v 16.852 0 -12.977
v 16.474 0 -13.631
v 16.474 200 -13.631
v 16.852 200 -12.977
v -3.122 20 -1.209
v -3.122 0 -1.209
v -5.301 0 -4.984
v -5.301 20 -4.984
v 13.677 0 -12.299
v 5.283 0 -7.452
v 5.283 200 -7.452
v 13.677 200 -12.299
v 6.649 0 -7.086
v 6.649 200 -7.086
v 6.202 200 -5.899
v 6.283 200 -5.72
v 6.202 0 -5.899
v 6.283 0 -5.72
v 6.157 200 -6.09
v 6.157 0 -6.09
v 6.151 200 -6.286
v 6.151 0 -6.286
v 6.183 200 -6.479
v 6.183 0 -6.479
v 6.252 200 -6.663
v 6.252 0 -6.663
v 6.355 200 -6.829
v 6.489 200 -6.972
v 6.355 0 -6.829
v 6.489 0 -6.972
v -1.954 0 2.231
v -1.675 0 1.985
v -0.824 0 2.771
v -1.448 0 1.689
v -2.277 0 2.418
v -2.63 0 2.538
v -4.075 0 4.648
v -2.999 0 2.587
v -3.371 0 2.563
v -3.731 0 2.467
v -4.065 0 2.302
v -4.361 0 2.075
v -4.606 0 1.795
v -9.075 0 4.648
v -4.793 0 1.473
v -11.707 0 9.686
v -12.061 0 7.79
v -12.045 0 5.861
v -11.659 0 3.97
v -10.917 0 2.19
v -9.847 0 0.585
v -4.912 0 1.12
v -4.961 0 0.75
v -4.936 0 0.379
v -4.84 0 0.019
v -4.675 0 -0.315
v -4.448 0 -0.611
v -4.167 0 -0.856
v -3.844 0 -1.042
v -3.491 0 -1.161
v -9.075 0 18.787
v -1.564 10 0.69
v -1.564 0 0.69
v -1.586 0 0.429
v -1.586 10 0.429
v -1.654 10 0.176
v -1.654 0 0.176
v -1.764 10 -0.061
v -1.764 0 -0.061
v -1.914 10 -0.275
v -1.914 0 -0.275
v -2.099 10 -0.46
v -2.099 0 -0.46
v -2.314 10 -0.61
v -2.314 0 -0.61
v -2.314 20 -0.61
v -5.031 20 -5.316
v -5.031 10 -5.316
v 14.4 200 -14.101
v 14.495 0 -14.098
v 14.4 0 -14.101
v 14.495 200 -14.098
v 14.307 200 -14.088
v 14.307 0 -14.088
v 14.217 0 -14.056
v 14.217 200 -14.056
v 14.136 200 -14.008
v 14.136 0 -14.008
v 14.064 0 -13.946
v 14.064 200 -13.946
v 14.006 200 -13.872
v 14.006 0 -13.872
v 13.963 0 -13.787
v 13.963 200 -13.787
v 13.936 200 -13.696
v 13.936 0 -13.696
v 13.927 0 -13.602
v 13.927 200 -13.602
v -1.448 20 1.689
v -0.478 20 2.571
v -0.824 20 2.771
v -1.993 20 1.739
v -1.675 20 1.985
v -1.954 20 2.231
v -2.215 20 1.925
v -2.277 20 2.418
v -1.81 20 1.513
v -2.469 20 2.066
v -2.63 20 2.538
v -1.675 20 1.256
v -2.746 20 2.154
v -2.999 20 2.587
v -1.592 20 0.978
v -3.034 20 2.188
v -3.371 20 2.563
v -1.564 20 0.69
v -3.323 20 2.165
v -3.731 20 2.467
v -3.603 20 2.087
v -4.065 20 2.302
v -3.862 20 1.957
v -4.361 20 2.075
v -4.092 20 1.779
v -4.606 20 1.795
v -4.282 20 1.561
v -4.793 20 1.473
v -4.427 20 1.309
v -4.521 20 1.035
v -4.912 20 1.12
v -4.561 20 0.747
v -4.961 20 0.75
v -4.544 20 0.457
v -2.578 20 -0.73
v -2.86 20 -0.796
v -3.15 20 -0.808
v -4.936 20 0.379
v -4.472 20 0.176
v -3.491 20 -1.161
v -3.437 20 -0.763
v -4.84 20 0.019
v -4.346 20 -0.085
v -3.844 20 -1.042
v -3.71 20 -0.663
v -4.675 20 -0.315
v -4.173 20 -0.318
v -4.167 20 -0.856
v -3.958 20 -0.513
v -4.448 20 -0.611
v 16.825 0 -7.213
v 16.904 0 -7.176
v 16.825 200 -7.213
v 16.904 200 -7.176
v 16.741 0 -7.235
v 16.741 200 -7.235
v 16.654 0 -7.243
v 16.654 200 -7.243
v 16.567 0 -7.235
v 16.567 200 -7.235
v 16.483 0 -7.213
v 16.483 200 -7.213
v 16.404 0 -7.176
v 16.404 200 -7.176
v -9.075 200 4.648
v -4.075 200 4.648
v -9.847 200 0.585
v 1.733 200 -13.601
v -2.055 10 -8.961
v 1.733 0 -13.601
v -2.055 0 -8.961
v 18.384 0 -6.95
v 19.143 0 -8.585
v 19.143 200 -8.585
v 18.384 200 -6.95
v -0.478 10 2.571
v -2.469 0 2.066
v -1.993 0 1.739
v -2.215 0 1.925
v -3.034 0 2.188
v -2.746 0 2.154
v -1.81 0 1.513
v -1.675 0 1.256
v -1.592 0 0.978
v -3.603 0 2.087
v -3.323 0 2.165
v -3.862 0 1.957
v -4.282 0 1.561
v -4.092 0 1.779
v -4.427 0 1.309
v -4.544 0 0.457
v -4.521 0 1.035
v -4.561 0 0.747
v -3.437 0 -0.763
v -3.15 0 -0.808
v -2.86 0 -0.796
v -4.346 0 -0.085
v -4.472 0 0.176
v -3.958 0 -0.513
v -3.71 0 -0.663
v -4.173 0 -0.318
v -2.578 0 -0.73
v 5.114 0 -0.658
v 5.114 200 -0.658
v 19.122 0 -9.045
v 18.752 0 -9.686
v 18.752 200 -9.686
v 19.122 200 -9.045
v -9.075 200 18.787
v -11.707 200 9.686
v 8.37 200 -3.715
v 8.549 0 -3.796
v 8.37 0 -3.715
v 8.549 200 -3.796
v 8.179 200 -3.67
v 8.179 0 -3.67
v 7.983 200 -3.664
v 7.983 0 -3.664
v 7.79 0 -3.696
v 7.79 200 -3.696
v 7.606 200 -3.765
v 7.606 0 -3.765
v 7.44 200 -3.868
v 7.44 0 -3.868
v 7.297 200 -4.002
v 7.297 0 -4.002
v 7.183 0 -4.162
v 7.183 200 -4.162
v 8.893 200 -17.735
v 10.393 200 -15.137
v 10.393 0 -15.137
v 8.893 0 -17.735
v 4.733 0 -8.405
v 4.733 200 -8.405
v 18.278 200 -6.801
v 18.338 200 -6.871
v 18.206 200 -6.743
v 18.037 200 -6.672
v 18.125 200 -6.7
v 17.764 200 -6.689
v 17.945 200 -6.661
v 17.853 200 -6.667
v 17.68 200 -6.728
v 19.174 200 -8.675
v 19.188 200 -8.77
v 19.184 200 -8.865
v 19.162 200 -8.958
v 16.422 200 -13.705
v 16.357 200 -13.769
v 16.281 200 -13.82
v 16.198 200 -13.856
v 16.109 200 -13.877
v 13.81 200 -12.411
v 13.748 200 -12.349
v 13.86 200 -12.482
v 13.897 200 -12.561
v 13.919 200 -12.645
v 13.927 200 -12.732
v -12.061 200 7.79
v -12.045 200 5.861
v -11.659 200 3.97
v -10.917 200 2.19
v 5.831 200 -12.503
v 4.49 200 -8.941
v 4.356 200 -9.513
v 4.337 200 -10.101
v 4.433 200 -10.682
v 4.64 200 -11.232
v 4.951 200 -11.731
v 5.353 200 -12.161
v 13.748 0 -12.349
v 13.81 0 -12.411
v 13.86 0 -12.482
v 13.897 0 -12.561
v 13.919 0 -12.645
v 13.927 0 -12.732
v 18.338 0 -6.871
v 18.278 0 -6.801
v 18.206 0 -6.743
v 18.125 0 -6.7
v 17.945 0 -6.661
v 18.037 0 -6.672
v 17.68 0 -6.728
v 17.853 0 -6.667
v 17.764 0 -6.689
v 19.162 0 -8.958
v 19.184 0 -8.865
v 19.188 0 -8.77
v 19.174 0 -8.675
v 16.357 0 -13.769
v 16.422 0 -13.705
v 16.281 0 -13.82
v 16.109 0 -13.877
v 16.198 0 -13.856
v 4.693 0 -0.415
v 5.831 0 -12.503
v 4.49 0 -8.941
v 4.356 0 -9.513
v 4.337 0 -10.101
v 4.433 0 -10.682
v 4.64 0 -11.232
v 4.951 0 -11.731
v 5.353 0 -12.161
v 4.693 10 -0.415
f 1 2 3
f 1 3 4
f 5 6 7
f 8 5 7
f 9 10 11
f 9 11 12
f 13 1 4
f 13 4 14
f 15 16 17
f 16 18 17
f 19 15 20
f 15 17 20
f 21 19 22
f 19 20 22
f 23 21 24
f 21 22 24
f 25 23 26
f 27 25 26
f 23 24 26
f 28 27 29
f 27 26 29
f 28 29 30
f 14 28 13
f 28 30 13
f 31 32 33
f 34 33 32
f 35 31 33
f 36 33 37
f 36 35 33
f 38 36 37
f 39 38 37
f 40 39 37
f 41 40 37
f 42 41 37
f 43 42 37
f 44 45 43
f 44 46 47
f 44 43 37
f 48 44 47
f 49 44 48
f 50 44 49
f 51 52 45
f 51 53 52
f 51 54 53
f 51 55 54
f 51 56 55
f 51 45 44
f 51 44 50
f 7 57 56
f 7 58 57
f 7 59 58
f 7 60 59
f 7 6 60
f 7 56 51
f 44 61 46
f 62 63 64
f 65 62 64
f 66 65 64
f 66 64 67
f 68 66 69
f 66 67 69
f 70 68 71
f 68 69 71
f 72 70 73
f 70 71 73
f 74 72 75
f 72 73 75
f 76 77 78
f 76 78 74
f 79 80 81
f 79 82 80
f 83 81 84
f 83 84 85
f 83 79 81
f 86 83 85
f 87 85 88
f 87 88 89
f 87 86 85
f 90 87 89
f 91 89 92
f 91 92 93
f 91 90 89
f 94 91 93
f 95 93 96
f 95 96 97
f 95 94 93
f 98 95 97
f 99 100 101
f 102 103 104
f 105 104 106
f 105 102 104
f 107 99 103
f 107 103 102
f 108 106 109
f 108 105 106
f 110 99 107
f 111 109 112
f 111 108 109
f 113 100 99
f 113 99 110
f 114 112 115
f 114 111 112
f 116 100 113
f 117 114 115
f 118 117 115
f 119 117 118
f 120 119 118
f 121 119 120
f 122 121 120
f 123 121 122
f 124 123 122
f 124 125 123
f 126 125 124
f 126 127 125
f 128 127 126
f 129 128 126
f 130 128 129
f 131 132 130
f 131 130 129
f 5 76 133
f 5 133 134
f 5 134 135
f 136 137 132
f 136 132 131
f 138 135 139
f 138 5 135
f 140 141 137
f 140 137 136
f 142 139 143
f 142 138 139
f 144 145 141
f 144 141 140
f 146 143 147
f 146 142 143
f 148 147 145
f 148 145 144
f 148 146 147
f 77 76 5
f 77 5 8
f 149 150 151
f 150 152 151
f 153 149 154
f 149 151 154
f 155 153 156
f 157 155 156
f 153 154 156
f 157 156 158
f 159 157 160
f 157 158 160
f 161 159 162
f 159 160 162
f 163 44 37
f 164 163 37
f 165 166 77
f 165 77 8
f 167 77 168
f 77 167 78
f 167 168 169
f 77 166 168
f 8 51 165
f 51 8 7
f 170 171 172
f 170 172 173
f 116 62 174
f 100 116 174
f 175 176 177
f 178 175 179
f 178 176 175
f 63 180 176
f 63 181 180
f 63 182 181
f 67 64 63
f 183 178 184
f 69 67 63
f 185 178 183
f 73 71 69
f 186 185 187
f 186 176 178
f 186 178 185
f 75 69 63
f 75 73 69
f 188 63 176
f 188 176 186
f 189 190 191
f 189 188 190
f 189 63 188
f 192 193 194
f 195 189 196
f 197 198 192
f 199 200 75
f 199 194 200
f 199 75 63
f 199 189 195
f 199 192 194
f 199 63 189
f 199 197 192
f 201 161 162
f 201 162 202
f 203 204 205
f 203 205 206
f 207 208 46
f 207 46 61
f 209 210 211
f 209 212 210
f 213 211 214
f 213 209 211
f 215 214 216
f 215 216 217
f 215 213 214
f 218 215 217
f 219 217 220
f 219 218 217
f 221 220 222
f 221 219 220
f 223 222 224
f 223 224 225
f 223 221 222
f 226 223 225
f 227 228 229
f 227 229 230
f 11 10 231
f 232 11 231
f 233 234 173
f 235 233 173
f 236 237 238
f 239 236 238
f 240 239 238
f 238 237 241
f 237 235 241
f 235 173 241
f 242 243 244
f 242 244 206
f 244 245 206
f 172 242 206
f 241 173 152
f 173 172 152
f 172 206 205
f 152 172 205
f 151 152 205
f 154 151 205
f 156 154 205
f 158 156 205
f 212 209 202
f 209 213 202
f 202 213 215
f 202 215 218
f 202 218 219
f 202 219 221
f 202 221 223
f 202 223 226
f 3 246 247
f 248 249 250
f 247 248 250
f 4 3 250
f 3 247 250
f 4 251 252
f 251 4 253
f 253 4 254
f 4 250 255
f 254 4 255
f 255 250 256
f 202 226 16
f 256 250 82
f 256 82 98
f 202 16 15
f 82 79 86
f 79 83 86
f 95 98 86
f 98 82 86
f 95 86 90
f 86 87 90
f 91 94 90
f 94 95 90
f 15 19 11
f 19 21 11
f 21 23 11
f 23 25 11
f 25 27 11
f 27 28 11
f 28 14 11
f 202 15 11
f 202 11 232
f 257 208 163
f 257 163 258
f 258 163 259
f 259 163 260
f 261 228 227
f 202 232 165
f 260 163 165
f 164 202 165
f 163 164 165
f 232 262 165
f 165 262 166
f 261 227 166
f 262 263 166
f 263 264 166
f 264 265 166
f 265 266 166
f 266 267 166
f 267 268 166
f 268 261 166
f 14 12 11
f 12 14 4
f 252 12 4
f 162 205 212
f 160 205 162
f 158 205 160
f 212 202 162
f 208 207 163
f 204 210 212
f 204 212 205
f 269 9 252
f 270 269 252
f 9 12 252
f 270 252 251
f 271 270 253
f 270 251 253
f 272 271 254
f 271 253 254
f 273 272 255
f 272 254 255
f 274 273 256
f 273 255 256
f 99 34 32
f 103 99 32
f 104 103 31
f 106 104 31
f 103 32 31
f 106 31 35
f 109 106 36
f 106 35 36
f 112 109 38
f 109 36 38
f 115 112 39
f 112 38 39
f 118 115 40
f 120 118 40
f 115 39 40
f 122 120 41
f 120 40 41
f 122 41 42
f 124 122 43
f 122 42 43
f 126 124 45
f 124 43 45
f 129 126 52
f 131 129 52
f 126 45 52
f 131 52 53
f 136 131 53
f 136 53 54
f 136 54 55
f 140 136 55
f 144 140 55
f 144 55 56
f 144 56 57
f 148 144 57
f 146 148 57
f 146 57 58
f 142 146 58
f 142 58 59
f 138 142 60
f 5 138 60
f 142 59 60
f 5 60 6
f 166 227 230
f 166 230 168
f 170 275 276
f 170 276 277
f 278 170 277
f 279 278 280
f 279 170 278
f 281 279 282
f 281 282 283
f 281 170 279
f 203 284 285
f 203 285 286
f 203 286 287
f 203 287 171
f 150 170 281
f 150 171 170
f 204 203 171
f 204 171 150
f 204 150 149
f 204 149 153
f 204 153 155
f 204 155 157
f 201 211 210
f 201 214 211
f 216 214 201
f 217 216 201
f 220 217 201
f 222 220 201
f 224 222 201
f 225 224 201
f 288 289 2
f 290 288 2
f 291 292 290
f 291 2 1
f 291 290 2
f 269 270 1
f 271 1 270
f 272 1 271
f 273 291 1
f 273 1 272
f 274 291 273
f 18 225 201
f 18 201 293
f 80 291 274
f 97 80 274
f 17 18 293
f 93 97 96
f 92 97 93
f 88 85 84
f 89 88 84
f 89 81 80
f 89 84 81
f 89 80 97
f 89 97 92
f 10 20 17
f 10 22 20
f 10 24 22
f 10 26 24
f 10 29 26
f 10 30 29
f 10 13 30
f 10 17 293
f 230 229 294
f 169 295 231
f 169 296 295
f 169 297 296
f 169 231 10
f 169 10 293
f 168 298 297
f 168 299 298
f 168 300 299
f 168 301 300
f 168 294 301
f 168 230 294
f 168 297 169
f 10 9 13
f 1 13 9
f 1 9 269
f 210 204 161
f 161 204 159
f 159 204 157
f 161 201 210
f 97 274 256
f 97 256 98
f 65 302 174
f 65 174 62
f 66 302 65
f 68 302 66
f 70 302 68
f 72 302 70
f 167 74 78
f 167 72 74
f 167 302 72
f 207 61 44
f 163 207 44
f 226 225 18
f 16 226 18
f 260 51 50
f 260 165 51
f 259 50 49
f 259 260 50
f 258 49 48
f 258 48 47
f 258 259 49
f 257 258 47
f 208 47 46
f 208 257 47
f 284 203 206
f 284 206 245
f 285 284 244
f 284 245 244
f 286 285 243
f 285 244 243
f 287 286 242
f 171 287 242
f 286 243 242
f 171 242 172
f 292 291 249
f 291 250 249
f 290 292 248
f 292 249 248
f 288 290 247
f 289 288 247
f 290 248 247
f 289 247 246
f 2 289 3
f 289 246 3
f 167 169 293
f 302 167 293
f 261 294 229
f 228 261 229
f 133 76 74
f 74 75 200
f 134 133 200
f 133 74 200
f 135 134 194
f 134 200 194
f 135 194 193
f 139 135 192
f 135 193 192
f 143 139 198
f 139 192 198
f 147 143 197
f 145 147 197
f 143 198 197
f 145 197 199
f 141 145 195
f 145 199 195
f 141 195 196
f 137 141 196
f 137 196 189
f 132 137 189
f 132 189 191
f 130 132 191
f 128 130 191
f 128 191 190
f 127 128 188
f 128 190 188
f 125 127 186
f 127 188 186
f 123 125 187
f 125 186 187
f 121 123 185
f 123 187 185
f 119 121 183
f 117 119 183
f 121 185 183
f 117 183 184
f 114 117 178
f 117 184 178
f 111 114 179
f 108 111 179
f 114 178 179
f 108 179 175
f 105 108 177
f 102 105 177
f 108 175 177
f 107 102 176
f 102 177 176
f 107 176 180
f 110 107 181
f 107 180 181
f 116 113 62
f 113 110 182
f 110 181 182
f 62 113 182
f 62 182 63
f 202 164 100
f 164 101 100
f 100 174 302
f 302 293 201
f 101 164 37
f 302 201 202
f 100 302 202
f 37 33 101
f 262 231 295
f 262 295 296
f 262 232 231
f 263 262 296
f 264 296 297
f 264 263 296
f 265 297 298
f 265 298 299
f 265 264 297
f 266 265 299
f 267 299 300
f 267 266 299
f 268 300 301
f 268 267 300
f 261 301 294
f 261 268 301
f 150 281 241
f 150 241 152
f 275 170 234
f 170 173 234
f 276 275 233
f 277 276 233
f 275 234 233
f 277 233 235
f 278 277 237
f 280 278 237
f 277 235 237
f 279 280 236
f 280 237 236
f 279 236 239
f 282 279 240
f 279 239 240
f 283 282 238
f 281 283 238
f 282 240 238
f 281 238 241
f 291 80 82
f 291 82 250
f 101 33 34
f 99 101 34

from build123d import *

# Parameters (mm, degrees)
BOSS_EXTRUDE1_DEPTH   = 200
BOSS_EXTRUDE1_2_DEPTH = 200
FILLET1_R             = 0.5
FILLET2_R             = 0.5
BOSS_EXTRUDE3_DEPTH   = 200
FILLET3_R             = 10
FILLET4_R             = 1
FILLET5_R             = 3
CUT_EXTRUDE2_DEPTH    = 20
CUT_EXTRUDE4_DEPTH    = 10


with BuildPart() as part:
    # Sketch1 → Boss-Extrude1 (new body)
    with BuildSketch(Plane(origin=(0, 0, 0), x_dir=(1, 0, 0), z_dir=(0, 1, 0))):
        Polygon((13.927082127, 14.175350351), (16.351953258, 13.843299543), (16.851953258, 12.977274139), (3.059579159, 5.014243241), (2.594699496, 5.900545381), (13.927082127, 12.443299543), align=None)
    extrude(amount=BOSS_EXTRUDE1_DEPTH)

    # Fillet2
    fillet2_edges = [part.edges().sort_by_distance(p)[0] for p in [
        (13.927082127, 100, -14.175350351),
        (16.351953258, 100, -13.843299543),
        (13.927082127, 100, -12.443299543),
    ]]
    fillet(fillet2_edges, radius=FILLET2_R)



with BuildPart() as body_2:
    # Sketch1 → Boss-Extrude1 2 (new body)
    with BuildSketch(Plane(origin=(0, 0, 0), x_dir=(1, 0, 0), z_dir=(0, 1, 0))):
        Polygon((18.751953258, 9.686377605), (19.251953258, 8.820352201), (18.153877046, 6.454326797), (16.653877046, 7.320352201), (5.114206816, 0.657920487), (4.719127398, 1.584521817), align=None)
    extrude(amount=BOSS_EXTRUDE1_2_DEPTH)

    # Fillet1
    fillet1_edges = [body_2.edges().sort_by_distance(p)[0] for p in [
        (19.251953258, 100, -8.820352201),
        (18.153877046, 100, -6.454326797),
        (16.653877046, 100, -7.320352201),
    ]]
    fillet(fillet1_edges, radius=FILLET1_R)


with BuildPart() as part_1:
    add(part.part)

    add(body_2.part)  # Boss-Extrude3 merges body 2
    # Sketch2 → Boss-Extrude3 (add)
    with BuildSketch(Plane(origin=(0, 0, 0), x_dir=(1, 0, 0), z_dir=(0, 1, 0))):
        Polygon((8.182648293, 2.429486), (3.232648293, 11.003137498), (10.393111947, 15.137233116), (8.893111947, 17.735309327), (1.732648293, 13.601213709), (-13.163737181, -4.647533202), (-9.075108531, -18.787281313), (-9.075108531, -4.647533202), (-4.075108531, -4.647533202), align=None)
    extrude(amount=BOSS_EXTRUDE3_DEPTH)

    # Fillet3
    fillet3_edges = [part_1.edges().sort_by_distance(p)[0] for p in [
        (-13.163737181, 100, 4.647533202),
    ]]
    fillet(fillet3_edges, radius=FILLET3_R)

    # Fillet4
    fillet4_edges = [part_1.edges().sort_by_distance(p)[0] for p in [
        (5.782648293, 100, -6.586407938),
        (7.682648293, 100, -3.295511404),
    ]]
    fillet(fillet4_edges, radius=FILLET4_R)

    # Fillet5
    fillet5_edges = [part_1.edges().sort_by_distance(p)[0] for p in [
        (3.232648293, 100, -11.003137498),
    ]]
    fillet(fillet5_edges, radius=FILLET5_R)

    # Sketch3 → Cut-Extrude2 (cut)
    with BuildSketch(Plane(origin=(0, 0, 0), x_dir=(1, 0, 0), z_dir=(0, 1, 0))):
        with BuildLine():
            Line((-6.589903921, 8.016296992), (-2.313602471, 0.609525612))
            ThreePointArc((-2.313602471, 0.609525612), (-4.361026605, -1.438580666), (-1.563602471, -0.689512493))
            Line((-1.563602471, -0.689512493), (0.970355299, -5.078456095))
            Line((0.970355299, -5.078456095), (0.623945137, -5.278456095))
            Line((0.623945137, -5.278456095), (-1.448316815, -1.689193106))
            ThreePointArc((-1.448316815, -1.689193106), (-4.707436766, -1.638580666), (-3.12170845, 1.209206225))
            Line((-3.12170845, 1.209206225), (-6.936314083, 7.816296992))
            Line((-6.936314083, 7.816296992), (-6.589903921, 8.016296992))
        make_face()
    extrude(amount=CUT_EXTRUDE2_DEPTH, mode=Mode.SUBTRACT)

    # Sketch4 → Cut-Extrude4 (cut)
    with BuildSketch(Plane(origin=(0, 0, 0), x_dir=(1, 0, 0), z_dir=(0, 1, 0))):
        with BuildLine():
            Line((-2.313602471, 0.609525612), (-5.030743669, 5.315752219))
            Line((-5.030743669, 5.315752219), (-2.055391297, 8.960693639))
            Line((-2.055391297, 8.960693639), (4.693297418, 0.414908333))
            Line((4.693297418, 0.414908333), (-0.477605745, -2.570514))
            Line((-0.477605745, -2.570514), (-1.563602471, -0.689512493))
            ThreePointArc((-1.563602471, -0.689512493), (-1.76444841, 0.060554453), (-2.313602471, 0.609525612))
        make_face()
    extrude(amount=CUT_EXTRUDE4_DEPTH, mode=Mode.SUBTRACT)


solid = part_1.part
